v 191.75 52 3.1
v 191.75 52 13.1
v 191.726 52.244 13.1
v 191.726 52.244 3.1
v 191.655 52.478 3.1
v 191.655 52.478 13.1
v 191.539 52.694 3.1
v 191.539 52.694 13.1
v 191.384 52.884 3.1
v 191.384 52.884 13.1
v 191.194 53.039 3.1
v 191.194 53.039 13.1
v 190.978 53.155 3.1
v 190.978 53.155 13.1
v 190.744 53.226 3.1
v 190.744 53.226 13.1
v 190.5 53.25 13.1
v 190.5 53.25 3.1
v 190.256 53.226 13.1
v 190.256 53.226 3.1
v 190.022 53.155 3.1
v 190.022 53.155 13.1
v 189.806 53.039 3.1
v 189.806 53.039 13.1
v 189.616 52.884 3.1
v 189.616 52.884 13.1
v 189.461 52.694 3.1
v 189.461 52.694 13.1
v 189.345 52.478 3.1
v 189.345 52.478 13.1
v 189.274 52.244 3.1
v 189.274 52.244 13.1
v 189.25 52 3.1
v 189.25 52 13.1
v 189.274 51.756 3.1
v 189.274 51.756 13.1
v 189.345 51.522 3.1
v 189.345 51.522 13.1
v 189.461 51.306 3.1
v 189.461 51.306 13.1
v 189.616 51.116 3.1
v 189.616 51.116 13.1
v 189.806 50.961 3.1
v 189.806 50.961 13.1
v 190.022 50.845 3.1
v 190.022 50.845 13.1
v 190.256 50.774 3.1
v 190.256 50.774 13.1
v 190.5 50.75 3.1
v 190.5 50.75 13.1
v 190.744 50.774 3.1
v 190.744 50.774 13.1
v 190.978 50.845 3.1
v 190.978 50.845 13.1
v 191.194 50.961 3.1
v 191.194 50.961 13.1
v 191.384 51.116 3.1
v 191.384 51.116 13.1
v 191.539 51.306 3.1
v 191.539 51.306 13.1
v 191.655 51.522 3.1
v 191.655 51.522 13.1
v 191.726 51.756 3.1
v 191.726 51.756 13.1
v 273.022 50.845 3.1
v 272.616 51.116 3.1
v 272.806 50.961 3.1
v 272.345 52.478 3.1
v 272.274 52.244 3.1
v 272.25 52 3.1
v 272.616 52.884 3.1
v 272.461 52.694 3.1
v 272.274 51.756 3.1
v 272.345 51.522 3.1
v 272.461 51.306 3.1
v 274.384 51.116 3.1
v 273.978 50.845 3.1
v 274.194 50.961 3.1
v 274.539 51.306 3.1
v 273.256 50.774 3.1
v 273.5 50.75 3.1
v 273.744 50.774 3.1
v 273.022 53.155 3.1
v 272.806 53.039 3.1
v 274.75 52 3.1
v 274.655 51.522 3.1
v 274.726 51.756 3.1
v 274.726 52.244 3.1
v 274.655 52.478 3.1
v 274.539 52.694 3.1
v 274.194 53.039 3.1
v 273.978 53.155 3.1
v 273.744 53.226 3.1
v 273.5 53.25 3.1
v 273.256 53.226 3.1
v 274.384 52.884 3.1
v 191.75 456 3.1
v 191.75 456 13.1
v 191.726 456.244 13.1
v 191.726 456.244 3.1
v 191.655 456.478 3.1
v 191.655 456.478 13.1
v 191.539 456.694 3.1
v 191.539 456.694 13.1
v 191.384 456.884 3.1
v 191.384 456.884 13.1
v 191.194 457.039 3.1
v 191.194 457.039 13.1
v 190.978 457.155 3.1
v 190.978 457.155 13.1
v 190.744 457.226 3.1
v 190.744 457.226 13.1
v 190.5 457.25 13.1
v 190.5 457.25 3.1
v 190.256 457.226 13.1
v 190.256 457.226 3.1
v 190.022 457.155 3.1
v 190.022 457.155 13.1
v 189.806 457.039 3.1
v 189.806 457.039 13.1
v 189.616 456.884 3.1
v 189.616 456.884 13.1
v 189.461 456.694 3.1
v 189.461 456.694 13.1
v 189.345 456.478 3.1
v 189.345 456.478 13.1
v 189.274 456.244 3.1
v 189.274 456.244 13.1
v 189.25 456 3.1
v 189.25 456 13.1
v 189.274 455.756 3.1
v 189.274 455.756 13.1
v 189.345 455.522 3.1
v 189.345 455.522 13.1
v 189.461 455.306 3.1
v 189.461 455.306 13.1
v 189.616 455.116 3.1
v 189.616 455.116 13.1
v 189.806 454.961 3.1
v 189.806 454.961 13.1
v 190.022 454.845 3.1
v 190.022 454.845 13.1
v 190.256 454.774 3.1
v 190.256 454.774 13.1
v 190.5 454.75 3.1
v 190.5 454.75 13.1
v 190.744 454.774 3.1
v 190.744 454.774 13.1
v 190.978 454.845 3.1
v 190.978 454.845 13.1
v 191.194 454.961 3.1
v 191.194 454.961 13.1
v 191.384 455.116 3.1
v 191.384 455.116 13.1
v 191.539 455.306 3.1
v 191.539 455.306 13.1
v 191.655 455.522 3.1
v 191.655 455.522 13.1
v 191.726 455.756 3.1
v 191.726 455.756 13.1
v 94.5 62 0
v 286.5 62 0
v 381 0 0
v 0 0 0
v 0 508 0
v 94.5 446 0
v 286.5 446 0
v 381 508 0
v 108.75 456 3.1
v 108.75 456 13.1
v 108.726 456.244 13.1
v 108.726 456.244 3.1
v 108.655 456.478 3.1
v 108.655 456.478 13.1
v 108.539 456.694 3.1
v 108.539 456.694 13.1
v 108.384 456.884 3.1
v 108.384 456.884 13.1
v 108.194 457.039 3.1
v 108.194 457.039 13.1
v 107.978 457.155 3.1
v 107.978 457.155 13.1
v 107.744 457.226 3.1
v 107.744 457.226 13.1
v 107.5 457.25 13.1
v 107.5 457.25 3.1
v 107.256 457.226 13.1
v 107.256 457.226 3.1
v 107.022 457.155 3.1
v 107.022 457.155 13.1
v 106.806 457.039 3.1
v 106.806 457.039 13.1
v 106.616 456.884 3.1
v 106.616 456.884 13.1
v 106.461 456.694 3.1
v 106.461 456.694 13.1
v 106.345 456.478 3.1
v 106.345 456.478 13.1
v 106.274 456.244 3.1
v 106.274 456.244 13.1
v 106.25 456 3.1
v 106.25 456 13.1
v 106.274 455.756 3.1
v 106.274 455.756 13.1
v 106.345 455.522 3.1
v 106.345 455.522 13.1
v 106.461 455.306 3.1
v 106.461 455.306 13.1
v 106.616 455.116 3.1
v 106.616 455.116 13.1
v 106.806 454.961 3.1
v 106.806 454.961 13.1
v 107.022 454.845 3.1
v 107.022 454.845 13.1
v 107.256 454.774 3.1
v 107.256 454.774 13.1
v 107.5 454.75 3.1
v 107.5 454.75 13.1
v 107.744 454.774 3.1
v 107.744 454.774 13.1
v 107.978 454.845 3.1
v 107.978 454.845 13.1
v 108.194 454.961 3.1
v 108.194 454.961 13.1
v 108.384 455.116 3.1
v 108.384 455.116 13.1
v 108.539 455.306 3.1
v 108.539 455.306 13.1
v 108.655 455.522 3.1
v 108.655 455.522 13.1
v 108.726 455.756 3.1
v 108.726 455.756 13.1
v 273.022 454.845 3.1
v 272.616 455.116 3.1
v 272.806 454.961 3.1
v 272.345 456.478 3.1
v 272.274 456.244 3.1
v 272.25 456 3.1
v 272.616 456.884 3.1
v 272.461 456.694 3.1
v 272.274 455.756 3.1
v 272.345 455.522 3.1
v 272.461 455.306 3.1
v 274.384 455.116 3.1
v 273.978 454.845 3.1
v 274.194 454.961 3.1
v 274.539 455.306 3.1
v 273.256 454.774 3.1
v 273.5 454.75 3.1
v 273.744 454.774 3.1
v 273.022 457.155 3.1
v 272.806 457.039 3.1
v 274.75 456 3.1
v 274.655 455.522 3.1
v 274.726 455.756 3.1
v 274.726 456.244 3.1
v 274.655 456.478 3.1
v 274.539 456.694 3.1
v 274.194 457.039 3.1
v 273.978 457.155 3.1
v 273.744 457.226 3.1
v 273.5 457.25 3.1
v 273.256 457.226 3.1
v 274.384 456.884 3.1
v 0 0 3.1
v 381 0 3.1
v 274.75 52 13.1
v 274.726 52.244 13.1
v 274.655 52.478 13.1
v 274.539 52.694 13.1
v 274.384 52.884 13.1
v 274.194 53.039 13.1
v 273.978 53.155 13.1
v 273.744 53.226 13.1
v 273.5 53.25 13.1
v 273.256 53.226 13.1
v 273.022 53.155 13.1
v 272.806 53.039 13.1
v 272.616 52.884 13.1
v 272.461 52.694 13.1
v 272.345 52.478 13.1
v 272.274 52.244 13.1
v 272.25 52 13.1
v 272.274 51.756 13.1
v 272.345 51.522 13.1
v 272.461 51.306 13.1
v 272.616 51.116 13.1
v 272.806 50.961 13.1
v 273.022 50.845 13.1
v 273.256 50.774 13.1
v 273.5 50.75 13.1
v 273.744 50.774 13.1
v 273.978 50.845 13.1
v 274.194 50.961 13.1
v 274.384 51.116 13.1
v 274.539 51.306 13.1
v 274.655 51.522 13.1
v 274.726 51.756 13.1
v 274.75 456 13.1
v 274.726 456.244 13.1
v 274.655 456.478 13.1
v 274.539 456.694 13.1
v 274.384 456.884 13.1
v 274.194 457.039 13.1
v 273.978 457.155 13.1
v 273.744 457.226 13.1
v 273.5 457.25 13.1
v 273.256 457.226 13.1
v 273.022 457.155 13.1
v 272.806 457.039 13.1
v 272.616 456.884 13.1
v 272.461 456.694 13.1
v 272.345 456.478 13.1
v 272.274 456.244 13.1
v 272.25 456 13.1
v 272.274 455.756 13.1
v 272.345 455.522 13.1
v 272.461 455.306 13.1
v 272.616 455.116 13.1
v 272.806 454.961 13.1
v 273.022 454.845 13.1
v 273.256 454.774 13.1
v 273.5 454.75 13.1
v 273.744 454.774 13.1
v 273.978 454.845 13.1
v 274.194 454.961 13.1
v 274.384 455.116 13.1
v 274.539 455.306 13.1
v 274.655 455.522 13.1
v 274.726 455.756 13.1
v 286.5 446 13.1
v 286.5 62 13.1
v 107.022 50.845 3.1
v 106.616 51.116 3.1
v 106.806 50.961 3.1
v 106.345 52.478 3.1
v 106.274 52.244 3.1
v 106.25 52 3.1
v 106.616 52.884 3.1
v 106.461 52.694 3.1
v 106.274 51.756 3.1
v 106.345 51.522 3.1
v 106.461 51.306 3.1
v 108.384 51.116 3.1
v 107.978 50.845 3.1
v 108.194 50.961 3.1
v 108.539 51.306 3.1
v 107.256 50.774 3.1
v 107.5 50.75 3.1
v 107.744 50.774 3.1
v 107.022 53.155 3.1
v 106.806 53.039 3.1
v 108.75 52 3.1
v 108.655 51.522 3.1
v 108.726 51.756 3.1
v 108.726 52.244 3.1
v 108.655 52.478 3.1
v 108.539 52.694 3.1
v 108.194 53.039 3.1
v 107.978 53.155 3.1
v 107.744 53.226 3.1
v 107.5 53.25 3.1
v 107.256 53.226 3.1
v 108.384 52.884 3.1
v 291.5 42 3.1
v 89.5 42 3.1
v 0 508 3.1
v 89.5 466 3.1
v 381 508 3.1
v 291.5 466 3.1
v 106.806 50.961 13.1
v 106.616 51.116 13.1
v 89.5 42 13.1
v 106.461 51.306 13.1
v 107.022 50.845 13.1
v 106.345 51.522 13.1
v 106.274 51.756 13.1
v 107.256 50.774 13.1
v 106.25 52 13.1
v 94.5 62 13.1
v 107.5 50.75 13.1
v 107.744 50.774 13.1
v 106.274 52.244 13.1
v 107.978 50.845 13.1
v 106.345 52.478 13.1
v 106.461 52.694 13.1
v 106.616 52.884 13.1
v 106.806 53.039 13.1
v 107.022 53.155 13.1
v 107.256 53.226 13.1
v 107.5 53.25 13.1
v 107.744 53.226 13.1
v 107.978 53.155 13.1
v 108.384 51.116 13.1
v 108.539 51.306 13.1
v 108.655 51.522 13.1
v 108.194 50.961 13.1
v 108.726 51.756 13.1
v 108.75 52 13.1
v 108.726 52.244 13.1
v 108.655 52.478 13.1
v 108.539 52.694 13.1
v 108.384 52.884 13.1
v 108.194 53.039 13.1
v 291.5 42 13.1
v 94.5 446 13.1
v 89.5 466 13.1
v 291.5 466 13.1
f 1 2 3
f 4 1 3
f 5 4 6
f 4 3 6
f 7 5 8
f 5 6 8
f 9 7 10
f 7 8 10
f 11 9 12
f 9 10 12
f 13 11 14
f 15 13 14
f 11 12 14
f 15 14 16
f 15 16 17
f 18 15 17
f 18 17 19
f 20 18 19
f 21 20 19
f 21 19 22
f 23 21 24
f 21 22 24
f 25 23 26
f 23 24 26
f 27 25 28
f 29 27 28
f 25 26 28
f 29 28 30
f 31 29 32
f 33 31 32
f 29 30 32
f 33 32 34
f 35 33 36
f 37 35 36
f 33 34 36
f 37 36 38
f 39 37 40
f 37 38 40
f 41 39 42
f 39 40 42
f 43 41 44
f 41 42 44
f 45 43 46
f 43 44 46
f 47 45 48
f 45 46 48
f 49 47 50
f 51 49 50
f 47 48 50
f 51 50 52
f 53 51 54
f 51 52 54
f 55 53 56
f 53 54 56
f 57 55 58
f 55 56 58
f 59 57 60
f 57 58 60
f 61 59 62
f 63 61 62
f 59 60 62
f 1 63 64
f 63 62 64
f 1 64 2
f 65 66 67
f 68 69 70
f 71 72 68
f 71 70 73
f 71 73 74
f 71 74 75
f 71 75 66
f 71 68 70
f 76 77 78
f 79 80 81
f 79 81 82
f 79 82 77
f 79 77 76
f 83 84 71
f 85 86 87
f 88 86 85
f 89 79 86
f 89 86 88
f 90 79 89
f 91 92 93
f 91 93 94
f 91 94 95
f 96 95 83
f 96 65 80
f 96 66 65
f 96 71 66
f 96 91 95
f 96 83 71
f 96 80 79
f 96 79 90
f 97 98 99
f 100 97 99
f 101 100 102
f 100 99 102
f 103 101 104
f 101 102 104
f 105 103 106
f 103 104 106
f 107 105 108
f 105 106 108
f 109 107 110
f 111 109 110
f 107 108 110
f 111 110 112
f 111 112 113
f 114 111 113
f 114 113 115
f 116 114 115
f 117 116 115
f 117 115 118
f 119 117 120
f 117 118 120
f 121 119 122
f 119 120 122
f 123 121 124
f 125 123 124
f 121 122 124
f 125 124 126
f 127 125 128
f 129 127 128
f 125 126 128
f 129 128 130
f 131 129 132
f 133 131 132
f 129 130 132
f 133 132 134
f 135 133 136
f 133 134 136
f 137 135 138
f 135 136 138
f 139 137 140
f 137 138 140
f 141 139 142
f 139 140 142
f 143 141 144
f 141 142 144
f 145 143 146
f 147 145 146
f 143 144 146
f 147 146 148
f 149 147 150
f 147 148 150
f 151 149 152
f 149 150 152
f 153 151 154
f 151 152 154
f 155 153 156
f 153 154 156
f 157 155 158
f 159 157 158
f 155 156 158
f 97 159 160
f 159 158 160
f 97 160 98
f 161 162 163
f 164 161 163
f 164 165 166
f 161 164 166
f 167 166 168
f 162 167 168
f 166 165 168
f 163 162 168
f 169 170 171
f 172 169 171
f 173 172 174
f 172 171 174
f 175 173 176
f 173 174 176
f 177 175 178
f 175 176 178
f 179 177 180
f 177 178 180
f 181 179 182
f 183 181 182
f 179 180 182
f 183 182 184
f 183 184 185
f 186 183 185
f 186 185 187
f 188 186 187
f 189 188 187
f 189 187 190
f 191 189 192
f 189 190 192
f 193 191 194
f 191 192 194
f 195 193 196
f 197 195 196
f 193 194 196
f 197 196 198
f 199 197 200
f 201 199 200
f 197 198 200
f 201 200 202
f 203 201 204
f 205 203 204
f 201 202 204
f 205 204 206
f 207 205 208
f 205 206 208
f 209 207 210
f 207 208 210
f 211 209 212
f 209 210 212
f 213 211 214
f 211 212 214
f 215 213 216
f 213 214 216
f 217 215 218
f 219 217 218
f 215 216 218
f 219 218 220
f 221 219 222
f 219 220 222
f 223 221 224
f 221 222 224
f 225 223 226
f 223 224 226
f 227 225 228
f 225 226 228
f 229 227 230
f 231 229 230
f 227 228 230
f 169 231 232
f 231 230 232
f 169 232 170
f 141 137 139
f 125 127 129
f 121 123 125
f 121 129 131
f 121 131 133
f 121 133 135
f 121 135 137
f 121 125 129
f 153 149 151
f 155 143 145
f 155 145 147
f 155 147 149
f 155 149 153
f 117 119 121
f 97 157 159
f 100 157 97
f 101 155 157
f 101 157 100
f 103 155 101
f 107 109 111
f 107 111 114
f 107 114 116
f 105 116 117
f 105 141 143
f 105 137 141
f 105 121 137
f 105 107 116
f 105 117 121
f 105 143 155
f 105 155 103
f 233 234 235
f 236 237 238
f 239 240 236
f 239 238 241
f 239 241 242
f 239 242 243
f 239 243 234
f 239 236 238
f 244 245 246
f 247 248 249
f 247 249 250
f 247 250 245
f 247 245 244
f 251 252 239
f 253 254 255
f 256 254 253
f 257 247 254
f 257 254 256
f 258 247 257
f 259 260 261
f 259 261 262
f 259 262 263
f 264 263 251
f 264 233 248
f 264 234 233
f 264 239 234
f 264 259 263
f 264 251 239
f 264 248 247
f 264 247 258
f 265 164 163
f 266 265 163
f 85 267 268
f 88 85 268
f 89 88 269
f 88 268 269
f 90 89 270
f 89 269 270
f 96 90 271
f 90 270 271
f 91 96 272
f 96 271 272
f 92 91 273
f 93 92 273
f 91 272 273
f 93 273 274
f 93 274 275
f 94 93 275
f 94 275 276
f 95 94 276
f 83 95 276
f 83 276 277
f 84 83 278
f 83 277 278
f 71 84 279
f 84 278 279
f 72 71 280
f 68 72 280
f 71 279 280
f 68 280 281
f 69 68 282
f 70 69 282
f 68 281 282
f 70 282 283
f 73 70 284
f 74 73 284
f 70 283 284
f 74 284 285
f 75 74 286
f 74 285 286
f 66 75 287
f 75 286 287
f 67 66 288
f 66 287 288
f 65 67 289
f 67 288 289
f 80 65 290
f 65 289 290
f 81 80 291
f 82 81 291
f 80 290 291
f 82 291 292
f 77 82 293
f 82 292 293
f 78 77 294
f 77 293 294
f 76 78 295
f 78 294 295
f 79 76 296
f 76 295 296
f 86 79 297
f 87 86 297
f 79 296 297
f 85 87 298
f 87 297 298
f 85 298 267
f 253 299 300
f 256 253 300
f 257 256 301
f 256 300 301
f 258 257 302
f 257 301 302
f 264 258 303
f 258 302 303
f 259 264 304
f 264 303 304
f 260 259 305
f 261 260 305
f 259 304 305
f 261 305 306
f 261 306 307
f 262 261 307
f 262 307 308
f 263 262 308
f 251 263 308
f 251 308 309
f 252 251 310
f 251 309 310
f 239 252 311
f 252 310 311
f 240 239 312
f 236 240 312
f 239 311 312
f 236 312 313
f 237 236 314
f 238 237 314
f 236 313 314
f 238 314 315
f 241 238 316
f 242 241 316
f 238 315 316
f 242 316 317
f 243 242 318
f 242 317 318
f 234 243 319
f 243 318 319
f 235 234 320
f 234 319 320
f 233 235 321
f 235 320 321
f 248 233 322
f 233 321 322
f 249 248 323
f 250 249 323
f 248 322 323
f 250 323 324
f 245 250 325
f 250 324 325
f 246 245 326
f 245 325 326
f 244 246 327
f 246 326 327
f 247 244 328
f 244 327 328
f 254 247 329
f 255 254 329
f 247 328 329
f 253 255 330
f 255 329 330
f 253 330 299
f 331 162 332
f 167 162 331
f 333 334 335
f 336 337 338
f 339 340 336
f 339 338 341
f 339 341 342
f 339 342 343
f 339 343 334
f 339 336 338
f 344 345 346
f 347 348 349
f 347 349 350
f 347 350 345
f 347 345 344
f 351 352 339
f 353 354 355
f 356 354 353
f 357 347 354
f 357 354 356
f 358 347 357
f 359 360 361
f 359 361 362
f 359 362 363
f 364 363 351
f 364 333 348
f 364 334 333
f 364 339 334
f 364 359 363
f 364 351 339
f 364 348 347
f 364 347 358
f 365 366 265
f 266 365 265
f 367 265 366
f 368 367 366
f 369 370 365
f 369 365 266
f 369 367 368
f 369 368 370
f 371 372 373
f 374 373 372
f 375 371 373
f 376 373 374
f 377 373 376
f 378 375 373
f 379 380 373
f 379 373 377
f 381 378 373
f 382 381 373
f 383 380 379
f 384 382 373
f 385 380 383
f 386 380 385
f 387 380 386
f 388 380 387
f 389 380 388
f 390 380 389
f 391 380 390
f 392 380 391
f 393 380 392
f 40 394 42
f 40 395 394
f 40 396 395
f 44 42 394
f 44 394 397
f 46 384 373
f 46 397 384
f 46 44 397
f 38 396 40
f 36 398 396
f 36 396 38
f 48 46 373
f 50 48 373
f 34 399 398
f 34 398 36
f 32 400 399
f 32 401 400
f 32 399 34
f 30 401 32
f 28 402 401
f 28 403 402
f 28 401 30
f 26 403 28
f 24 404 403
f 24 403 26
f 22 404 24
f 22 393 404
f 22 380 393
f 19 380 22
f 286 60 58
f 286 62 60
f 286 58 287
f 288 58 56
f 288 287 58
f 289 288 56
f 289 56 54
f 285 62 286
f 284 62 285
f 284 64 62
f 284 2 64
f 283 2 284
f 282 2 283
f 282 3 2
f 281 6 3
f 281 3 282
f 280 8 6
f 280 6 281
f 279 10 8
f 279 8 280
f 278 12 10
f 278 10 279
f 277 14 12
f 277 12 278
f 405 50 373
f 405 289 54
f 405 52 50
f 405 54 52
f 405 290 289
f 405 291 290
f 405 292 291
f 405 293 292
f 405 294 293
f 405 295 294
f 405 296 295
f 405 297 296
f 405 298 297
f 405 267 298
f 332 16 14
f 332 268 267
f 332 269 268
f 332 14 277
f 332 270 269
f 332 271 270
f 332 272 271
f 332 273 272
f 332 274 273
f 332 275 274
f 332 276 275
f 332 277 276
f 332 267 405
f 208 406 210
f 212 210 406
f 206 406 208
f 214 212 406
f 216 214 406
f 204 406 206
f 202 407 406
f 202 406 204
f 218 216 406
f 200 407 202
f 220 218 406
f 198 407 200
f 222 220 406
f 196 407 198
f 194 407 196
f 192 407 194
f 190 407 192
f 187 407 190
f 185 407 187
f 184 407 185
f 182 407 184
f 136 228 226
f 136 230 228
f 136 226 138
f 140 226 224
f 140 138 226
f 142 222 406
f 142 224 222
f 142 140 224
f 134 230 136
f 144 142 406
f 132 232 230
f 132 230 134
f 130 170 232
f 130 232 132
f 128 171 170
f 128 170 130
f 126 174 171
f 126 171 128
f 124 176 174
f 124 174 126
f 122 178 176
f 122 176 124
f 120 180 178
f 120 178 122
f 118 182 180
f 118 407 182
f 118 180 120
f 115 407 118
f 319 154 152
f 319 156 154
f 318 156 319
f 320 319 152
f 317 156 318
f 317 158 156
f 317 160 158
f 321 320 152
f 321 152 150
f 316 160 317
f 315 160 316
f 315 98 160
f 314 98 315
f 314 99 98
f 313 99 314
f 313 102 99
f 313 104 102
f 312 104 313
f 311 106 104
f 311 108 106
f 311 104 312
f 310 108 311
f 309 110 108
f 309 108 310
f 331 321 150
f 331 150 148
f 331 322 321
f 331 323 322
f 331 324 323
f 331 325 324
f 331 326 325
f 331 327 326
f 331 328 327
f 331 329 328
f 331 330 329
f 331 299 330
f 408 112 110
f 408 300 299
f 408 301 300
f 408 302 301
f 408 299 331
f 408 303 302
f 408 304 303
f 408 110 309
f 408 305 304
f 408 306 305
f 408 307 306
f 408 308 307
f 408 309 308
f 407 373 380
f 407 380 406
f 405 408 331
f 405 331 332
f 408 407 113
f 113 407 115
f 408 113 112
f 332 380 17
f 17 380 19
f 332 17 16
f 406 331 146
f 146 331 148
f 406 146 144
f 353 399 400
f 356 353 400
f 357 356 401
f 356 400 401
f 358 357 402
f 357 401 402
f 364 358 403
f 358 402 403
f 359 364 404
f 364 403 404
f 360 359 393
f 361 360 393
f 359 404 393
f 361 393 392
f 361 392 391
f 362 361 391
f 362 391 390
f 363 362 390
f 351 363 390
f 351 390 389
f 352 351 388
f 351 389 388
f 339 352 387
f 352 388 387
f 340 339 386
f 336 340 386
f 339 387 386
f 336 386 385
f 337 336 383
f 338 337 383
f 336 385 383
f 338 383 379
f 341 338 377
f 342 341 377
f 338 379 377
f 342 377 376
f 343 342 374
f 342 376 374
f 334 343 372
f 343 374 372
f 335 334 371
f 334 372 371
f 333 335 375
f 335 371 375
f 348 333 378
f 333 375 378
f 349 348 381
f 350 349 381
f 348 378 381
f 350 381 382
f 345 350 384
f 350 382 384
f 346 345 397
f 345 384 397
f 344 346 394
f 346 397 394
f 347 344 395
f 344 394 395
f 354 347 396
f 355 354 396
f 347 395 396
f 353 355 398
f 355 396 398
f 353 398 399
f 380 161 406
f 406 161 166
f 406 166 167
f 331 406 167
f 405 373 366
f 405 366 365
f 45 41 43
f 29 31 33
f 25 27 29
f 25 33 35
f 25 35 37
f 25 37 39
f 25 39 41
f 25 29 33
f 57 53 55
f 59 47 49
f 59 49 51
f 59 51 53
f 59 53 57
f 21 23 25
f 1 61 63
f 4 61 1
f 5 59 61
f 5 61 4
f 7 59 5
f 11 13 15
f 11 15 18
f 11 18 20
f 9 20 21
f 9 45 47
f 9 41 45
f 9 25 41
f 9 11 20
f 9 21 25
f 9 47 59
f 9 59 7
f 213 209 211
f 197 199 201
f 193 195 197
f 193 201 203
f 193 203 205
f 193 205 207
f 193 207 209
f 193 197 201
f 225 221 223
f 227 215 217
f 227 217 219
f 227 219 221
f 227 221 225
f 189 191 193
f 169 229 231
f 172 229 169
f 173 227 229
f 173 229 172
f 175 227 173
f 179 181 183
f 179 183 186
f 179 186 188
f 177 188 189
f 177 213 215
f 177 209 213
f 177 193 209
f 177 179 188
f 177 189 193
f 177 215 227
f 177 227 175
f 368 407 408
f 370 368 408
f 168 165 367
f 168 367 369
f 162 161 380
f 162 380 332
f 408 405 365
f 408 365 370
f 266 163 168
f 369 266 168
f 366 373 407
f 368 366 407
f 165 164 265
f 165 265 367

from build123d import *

# Parameters (mm, degrees)
SKETCH1_W           = 381
SKETCH1_H           = 508
SKETCH1_W_2         = 192
SKETCH1_H_2         = 384
BOSS_EXTRUDE1_DEPTH = 13.1
SKETCH11_R          = 1.25
CUT_EXTRUDE4_DEPTH  = 10
SKETCH12_R          = 1.25
CUT_EXTRUDE5_DEPTH  = 10
SKETCH19_R          = 1.25
CUT_EXTRUDE6_DEPTH  = 10
SKETCH20_W          = 89.5
SKETCH20_H          = 508
CUT_EXTRUDE7_DEPTH  = 10
SKETCH21_W          = 202
SKETCH21_H          = 42
CUT_EXTRUDE8_DEPTH  = 10


with BuildPart() as part:
    # Sketch1 → Boss-Extrude1 (new body)
    with BuildSketch(Plane.XY):
        with Locations((190.5, 254)):
            Rectangle(SKETCH1_W, SKETCH1_H)
        with Locations((190.5, 254)):
            Rectangle(SKETCH1_W_2, SKETCH1_H_2, mode=Mode.SUBTRACT)
    extrude(amount=BOSS_EXTRUDE1_DEPTH)

    # Sketch11 → Cut-Extrude4 (cut)
    with BuildSketch(Plane.XY.offset(13.1)):
        with Locations((107.5, 456)):
            Circle(SKETCH11_R)
    extrude(amount=-CUT_EXTRUDE4_DEPTH, mode=Mode.SUBTRACT)

    # Sketch12 → Cut-Extrude5 (cut)
    with BuildSketch(Plane.XY.offset(13.1)):
        with Locations((273.5, 456)):
            Circle(SKETCH12_R)
        with Locations((107.5, 52)):
            Circle(SKETCH12_R)
        with Locations((273.5, 52)):
            Circle(SKETCH12_R)
    extrude(amount=-CUT_EXTRUDE5_DEPTH, mode=Mode.SUBTRACT)

    # Sketch19 → Cut-Extrude6 (cut)
    with BuildSketch(Plane.XY.offset(13.1)):
        with Locations((190.5, 456)):
            Circle(SKETCH19_R)
        with Locations((190.5, 52)):
            Circle(SKETCH19_R)
    extrude(amount=-CUT_EXTRUDE6_DEPTH, mode=Mode.SUBTRACT)

    # Sketch20 → Cut-Extrude7 (cut)
    with BuildSketch(Plane.XY.offset(13.1)):
        with Locations((44.75, 254)):
            Rectangle(SKETCH20_W, SKETCH20_H)
        with Locations((336.25, 254)):
            Rectangle(SKETCH20_W, SKETCH20_H)
    extrude(amount=-CUT_EXTRUDE7_DEPTH, mode=Mode.SUBTRACT)

    # Sketch21 → Cut-Extrude8 (cut)
    with BuildSketch(Plane.XY.offset(13.1)):
        with Locations((190.5, 487)):
            Rectangle(SKETCH21_W, SKETCH21_H)
        with Locations((190.5, 21)):
            Rectangle(SKETCH21_W, SKETCH21_H)
    extrude(amount=-CUT_EXTRUDE8_DEPTH, mode=Mode.SUBTRACT)


solid = part.part
